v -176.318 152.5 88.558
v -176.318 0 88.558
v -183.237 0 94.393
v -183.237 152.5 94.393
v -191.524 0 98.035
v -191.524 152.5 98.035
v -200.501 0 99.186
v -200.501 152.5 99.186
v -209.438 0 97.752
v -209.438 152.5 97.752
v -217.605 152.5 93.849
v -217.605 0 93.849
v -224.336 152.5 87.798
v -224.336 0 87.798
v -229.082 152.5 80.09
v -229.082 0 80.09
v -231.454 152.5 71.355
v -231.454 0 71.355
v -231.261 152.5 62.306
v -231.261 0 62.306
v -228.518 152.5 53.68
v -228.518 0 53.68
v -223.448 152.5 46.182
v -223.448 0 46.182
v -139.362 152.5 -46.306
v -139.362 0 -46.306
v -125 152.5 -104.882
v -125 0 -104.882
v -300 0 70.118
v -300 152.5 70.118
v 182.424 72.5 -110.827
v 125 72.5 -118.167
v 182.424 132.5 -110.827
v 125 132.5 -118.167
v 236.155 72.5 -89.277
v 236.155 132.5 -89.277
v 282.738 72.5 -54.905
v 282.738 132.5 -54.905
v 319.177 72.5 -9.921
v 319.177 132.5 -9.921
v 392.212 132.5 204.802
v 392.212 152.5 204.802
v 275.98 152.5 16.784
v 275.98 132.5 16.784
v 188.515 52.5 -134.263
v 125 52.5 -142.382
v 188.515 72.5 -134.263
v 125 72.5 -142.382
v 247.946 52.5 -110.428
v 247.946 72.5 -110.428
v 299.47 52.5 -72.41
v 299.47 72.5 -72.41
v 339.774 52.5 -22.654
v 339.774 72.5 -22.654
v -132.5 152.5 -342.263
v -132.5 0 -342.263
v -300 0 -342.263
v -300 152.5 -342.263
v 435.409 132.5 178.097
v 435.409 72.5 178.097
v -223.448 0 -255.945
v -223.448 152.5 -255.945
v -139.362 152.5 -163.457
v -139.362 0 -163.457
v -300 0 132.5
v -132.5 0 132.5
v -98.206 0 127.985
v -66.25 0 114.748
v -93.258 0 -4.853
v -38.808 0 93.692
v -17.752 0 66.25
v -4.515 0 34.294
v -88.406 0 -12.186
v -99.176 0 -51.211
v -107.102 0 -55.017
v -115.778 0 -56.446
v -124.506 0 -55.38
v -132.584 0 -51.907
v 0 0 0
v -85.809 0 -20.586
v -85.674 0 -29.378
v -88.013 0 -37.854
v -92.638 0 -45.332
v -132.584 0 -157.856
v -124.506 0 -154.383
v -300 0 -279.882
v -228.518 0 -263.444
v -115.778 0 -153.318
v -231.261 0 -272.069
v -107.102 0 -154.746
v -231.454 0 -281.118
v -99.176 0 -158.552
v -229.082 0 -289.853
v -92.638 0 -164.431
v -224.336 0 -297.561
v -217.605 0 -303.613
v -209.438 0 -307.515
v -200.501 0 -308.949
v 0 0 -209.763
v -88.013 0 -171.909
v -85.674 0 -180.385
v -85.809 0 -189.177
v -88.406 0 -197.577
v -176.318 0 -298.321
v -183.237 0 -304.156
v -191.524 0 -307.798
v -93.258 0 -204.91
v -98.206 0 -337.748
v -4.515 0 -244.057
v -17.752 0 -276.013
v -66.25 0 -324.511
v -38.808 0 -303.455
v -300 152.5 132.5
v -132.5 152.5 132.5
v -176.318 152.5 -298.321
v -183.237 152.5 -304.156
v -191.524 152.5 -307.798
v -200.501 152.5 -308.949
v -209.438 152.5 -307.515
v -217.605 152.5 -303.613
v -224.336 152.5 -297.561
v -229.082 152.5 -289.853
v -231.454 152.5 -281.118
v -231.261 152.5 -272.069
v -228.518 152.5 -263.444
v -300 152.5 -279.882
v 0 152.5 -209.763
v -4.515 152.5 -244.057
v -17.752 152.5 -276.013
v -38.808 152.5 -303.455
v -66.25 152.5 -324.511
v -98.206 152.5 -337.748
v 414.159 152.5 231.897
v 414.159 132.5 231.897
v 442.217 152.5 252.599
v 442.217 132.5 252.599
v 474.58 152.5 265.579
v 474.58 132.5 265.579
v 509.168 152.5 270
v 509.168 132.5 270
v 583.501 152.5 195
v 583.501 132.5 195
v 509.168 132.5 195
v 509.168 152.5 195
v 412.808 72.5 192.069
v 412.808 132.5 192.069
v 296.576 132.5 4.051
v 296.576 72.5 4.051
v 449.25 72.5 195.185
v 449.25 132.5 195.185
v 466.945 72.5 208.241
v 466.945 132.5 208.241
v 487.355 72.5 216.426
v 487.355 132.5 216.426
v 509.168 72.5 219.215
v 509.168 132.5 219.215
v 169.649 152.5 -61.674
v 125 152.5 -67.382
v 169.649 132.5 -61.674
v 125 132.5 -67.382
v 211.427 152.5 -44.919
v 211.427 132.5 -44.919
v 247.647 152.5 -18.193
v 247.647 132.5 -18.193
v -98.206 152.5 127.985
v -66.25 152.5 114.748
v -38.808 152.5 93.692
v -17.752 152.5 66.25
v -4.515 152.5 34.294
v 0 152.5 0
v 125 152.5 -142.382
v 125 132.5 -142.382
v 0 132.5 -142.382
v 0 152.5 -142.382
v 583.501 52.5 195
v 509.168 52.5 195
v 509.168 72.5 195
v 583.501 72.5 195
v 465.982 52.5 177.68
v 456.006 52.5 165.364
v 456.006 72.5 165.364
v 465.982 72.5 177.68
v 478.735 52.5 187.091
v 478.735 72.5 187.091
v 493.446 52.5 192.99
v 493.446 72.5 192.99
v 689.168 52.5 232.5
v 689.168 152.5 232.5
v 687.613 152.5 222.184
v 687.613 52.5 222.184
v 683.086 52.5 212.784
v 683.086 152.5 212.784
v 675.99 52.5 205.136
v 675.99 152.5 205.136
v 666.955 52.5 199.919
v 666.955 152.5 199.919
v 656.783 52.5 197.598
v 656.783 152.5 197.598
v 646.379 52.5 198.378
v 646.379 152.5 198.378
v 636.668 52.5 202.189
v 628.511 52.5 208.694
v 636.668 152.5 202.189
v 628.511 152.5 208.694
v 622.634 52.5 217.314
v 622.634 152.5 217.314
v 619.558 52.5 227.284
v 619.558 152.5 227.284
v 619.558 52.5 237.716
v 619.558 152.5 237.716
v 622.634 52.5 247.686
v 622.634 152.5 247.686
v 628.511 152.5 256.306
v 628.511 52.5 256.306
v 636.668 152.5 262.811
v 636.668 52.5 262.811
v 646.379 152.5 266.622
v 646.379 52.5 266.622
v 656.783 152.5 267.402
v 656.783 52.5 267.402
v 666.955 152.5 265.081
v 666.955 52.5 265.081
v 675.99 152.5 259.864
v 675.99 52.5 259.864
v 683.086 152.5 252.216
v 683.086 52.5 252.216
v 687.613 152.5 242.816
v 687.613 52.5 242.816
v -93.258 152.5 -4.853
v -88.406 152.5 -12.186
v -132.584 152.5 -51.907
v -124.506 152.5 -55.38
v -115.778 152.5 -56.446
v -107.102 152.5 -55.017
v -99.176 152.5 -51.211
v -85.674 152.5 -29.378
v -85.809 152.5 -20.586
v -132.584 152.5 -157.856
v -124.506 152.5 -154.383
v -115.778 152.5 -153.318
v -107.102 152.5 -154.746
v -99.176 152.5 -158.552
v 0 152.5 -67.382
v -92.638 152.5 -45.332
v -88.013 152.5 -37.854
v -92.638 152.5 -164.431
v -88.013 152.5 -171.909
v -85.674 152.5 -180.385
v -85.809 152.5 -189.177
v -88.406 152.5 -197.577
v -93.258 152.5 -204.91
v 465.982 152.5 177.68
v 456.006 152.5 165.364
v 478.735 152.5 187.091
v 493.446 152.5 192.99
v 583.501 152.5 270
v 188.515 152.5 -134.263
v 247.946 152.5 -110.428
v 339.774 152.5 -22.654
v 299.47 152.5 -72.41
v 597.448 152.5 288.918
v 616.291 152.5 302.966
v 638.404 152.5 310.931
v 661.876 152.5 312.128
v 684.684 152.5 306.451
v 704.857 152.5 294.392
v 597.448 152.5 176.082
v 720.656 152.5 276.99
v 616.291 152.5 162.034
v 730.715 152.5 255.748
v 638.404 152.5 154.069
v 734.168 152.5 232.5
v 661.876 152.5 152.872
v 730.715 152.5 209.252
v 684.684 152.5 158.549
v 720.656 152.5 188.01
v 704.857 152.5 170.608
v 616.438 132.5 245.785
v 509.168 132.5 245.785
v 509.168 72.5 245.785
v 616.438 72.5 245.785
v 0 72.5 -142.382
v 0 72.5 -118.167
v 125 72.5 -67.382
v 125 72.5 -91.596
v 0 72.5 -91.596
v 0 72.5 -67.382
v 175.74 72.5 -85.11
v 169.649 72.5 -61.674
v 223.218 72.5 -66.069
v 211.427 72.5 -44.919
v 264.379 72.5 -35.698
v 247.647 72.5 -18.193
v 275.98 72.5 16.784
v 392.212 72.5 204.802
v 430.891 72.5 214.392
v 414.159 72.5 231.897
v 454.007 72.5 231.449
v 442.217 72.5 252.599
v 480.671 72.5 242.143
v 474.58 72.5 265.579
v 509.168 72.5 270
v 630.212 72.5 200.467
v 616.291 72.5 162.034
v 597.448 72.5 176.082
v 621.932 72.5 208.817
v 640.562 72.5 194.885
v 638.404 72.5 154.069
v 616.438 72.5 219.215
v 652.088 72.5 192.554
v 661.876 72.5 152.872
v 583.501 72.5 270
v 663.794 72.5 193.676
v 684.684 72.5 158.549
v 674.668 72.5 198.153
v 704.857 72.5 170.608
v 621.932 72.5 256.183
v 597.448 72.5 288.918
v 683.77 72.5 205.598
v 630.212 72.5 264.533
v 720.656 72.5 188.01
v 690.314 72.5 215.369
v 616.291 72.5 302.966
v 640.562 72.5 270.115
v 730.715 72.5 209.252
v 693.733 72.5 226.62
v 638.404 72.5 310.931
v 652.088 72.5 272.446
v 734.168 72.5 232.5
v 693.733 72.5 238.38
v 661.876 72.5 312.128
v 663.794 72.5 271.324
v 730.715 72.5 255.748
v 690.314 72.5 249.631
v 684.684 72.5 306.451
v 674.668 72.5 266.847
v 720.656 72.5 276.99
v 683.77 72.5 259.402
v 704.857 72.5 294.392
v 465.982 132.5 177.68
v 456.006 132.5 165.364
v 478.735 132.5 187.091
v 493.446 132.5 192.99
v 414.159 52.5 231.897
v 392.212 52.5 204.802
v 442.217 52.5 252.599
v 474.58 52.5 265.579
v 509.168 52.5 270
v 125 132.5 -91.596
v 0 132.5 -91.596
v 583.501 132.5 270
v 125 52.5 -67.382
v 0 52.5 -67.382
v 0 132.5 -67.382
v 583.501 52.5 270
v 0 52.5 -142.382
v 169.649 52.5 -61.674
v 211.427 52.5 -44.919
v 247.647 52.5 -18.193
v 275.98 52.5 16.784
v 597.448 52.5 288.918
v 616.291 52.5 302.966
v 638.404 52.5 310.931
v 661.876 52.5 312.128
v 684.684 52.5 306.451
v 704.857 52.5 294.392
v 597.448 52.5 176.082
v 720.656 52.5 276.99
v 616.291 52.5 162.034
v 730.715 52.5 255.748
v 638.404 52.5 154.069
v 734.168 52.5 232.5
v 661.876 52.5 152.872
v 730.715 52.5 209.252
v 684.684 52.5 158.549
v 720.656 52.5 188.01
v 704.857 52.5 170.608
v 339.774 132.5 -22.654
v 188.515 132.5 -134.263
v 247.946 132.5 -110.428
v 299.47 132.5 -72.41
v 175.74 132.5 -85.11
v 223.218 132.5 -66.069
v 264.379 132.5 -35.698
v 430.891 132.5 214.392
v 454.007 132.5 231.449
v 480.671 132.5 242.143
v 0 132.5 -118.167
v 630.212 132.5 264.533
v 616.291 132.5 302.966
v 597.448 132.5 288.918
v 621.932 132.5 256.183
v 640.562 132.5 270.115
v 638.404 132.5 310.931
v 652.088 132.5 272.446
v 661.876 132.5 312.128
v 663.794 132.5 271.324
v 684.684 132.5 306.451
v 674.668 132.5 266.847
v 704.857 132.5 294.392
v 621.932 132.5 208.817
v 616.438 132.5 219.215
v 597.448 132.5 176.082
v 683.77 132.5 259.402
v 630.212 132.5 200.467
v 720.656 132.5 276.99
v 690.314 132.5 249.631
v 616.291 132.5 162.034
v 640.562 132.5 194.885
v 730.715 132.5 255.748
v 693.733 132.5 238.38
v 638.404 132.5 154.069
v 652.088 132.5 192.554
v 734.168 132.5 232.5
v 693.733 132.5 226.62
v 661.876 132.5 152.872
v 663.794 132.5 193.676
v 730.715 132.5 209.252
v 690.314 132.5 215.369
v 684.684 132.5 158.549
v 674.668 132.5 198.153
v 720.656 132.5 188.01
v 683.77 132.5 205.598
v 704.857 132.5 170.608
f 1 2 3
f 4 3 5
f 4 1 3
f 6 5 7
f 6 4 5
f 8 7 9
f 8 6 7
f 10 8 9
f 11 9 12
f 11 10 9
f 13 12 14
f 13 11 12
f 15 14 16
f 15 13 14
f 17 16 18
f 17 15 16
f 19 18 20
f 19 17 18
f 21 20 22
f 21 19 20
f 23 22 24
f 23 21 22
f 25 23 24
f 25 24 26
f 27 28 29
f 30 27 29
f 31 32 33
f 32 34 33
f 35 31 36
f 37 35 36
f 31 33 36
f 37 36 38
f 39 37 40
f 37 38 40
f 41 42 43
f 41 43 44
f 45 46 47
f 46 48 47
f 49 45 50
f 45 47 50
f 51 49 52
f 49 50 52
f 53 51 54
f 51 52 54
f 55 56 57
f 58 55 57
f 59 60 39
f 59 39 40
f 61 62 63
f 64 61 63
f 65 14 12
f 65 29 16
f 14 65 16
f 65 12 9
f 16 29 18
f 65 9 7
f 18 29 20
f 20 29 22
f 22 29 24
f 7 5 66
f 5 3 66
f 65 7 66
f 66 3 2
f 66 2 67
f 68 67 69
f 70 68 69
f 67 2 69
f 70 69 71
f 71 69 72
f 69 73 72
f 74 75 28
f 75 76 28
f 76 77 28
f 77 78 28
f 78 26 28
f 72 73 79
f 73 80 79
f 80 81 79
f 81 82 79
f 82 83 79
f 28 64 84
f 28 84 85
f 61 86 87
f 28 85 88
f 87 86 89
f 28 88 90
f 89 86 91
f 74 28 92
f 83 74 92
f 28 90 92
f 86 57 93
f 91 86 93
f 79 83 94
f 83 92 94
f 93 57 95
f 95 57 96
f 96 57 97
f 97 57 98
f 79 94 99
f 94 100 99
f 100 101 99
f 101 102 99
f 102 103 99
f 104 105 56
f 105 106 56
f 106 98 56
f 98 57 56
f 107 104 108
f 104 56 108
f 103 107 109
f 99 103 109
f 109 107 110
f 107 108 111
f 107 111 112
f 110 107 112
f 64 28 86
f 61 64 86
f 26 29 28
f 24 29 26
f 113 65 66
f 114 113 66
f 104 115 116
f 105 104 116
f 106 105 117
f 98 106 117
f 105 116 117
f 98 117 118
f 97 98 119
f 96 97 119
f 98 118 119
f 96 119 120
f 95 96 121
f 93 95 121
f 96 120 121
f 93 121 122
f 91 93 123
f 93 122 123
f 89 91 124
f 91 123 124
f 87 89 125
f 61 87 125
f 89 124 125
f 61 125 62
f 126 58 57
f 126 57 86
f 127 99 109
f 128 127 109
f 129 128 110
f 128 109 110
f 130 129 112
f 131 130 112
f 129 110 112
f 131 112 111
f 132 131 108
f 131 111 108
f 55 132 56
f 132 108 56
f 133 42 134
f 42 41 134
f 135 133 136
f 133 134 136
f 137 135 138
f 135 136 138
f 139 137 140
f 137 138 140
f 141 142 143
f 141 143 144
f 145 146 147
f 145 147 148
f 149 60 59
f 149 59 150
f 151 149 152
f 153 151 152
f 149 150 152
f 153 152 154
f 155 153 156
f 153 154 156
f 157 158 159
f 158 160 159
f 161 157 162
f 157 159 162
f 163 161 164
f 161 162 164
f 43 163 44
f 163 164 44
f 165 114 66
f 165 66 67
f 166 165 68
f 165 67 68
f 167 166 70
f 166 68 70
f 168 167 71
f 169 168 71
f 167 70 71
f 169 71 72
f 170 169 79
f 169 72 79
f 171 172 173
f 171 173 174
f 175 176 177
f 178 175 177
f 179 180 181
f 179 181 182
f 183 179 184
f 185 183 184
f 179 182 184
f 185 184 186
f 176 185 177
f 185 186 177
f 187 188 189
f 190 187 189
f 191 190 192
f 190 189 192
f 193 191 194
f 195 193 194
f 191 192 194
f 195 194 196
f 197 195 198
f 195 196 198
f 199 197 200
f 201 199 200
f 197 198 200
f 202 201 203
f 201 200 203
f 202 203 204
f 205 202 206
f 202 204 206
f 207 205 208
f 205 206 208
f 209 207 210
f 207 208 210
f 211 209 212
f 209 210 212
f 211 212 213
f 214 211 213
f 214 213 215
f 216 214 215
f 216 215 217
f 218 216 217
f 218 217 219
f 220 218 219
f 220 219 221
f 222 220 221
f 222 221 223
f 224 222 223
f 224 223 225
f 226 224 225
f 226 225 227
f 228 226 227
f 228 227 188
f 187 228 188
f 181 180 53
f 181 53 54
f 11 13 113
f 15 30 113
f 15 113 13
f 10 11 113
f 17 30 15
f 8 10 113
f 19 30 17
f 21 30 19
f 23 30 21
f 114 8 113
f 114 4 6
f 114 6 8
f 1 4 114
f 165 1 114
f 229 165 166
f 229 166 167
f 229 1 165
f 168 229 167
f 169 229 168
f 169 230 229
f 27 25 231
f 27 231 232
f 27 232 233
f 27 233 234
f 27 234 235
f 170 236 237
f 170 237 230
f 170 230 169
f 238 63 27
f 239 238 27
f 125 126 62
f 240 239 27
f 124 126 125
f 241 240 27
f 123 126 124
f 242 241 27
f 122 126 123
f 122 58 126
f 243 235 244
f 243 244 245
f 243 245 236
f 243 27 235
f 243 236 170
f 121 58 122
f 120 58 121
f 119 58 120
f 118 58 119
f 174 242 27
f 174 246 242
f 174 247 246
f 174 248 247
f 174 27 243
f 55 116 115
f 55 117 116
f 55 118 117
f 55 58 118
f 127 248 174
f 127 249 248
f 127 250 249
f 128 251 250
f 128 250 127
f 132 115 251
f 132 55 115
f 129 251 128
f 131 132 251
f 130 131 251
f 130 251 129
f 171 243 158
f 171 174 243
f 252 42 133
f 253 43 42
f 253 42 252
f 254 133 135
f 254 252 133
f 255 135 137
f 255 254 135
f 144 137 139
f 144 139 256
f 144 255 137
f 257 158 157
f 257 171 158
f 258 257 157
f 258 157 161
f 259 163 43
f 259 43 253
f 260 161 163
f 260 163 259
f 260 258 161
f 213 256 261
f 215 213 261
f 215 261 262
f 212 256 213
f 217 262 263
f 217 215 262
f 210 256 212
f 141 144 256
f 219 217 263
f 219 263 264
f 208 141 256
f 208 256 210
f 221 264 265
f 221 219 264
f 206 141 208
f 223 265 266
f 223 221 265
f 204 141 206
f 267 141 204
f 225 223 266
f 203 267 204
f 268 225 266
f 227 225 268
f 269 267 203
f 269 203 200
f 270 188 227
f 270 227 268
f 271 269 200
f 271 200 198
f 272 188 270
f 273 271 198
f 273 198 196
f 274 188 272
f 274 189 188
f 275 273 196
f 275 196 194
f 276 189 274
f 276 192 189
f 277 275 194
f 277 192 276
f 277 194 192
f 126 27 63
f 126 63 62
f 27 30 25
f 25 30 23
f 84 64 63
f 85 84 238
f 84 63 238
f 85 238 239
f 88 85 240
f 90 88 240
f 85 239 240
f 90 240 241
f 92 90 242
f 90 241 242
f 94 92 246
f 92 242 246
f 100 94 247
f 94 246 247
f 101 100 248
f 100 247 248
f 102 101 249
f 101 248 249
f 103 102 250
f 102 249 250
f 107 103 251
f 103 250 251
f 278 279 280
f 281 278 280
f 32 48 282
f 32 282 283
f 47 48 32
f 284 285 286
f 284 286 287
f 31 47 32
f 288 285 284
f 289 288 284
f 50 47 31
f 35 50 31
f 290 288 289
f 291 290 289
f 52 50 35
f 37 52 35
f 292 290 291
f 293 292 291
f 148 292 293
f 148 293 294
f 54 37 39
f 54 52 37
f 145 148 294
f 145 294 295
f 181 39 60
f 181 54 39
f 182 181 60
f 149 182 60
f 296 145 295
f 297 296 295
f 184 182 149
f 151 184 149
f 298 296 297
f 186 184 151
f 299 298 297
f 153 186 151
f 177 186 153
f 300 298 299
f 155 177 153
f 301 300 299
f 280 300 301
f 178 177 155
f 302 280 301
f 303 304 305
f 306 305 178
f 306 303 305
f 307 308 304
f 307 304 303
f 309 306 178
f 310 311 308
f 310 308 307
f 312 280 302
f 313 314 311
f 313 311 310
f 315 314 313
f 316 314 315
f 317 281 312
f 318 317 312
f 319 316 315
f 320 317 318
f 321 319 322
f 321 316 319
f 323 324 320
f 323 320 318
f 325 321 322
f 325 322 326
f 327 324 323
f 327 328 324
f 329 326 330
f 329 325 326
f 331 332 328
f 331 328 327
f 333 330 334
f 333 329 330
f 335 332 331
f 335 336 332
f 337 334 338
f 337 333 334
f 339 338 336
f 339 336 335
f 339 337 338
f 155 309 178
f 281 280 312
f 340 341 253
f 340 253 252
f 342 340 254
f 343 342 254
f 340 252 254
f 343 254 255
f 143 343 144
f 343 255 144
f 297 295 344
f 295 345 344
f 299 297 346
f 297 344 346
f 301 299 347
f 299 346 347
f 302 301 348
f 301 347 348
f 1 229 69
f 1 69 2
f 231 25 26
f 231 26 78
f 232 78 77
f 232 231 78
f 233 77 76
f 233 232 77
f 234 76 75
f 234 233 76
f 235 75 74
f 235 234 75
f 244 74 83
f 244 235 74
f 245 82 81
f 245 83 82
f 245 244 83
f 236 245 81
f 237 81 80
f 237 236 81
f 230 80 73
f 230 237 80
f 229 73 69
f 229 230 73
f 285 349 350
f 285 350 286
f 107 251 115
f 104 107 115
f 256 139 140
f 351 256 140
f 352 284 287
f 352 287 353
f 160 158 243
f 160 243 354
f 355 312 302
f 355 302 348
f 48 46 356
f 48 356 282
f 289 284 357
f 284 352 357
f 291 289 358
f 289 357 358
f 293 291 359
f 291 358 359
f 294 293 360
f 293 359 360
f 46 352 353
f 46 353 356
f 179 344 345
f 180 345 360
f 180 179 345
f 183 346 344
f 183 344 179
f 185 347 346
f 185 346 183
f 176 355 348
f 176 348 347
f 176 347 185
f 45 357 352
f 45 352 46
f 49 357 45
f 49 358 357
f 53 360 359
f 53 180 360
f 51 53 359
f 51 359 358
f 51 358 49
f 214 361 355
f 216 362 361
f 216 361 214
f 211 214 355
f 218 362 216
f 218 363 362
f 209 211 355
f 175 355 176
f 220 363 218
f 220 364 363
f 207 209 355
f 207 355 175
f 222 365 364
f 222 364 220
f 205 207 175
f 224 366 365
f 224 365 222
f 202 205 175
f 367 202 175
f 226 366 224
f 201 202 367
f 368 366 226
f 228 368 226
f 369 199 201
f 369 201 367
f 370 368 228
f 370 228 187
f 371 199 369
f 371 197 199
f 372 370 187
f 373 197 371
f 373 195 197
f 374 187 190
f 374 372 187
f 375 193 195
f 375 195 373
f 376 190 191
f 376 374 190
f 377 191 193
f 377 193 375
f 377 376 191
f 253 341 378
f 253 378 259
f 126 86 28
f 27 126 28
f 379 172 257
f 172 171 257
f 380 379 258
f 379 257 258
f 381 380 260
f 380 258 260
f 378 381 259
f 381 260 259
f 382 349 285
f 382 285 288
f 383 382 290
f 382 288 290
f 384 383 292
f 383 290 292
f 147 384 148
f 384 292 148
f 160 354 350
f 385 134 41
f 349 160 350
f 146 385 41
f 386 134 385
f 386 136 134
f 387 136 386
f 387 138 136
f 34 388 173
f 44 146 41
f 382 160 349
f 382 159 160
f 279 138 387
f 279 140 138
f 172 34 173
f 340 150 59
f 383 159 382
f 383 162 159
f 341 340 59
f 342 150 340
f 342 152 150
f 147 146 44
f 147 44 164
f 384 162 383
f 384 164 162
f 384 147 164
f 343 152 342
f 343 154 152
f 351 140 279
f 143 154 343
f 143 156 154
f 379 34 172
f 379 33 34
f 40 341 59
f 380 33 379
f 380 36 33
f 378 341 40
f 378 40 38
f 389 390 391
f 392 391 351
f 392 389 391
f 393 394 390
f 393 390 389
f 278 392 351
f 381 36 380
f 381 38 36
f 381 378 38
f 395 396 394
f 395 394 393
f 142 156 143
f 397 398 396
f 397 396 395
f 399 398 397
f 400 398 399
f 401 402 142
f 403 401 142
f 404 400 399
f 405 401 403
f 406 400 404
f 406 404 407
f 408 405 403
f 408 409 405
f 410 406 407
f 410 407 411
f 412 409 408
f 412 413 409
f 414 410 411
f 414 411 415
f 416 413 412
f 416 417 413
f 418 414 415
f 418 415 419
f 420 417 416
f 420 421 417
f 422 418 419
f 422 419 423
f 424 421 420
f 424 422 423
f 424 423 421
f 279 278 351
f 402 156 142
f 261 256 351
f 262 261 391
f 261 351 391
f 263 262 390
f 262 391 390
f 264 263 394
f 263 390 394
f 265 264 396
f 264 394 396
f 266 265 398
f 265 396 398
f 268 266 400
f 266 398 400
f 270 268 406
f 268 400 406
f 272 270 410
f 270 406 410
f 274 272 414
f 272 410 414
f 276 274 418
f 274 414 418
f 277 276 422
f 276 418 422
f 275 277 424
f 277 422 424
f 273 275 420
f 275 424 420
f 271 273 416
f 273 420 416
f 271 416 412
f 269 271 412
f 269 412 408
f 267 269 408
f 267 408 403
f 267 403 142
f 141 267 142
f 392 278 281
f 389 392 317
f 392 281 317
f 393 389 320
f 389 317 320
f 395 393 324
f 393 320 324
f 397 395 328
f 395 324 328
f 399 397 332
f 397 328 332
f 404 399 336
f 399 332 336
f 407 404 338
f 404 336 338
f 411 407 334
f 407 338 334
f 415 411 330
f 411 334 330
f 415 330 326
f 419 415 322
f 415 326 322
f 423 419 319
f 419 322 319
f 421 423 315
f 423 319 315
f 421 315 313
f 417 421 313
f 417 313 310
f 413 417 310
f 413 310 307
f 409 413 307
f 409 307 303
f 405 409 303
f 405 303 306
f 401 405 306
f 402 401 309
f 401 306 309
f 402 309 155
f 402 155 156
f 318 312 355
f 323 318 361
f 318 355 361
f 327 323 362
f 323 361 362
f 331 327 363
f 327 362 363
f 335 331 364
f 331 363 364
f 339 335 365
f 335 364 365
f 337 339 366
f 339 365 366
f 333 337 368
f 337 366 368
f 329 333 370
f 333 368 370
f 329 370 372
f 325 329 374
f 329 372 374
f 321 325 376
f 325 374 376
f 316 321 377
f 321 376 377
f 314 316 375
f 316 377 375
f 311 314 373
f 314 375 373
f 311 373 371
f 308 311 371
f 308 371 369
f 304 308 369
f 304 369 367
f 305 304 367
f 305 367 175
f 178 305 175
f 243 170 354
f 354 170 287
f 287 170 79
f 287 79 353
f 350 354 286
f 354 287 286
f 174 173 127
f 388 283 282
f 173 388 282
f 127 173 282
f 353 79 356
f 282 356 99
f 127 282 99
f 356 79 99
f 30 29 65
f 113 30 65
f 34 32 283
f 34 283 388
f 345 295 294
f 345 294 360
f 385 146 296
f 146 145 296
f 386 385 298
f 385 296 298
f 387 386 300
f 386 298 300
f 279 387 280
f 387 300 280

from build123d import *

# Parameters (mm, degrees)
BOSS_EXTRUDE1_DEPTH = 152.5
CUT_EXTRUDE1_DEPTH  = 153.5
CUT_EXTRUDE2_REACH  = 154.5
SKETCH7_R           = 35


with BuildPart() as part:
    # Sketch1 → Boss-Extrude1 (new body)
    with BuildSketch(Plane(origin=(0, 0, 0), x_dir=(1, 0, 0), z_dir=(0, 1, 0))):
        with BuildLine():
            Line((-300, -132.5), (-132.5, -132.5))
            ThreePointArc((-132.5, -132.5), (-38.808351493, -93.691648507), (0, 0))
            Line((0, 0), (0, 209.763098819))
            ThreePointArc((0, 209.763098819), (-38.808351493, 303.454747326), (-132.5, 342.263098819))
            Line((-132.5, 342.263098819), (-300, 342.263098819))
            Line((-300, 342.263098819), (-300, 279.881549409))
            Line((-300, 279.881549409), (-125, 104.881549409))
            Line((-125, 104.881549409), (-300, -70.118450591))
            Line((-300, -70.118450591), (-300, -132.5))
        make_face()
    extrude(amount=BOSS_EXTRUDE1_DEPTH)

    # Sketch2 → Cut-Extrude1 (cut, through all)
    with BuildSketch(Plane(origin=(0, 152.5, 0), x_dir=(1, 0, 0), z_dir=(0, 1, 0))):
        with BuildLine():
            Line((-223.447835998, -46.182307711), (-139.361825834, 46.305891731))
            ThreePointArc((-139.361825834, 46.305891731), (-95.697655057, 48.504400086), (-93.258215037, 4.853026901))
            Line((-93.258215037, 4.853026901), (-176.318308109, -88.557599262))
            ThreePointArc((-176.318308109, -88.557599262), (-221.187968417, -91.065122785), (-223.447835998, -46.182307711))
        make_face()
        with BuildLine():
            Line((-93.258215037, 204.910071918), (-176.318308109, 298.320698081))
            ThreePointArc((-176.318308109, 298.320698081), (-221.187968417, 300.828221603), (-223.447835998, 255.94540653))
            Line((-223.447835998, 255.94540653), (-139.361825834, 163.457207088))
            ThreePointArc((-139.361825834, 163.457207088), (-95.697655057, 161.258698732), (-93.258215037, 204.910071918))
        make_face()
    extrude(amount=-CUT_EXTRUDE1_DEPTH, mode=Mode.SUBTRACT)

    # Sweep2: sweep along a path in Sketch4
    with BuildLine(Plane(origin=(0, 0, 0), x_dir=(1, 0, 0), z_dir=(0, 1, 0))) as sweep2_path:
        Line((0, 104.881549409), (125, 104.881549409))
        ThreePointArc((125, 104.881549409), (229.686421658, 77.6733307), (307.876740467, 2.935066808))
        Line((307.876740467, 2.935066808), (424.108620349, -185.083031348))
        ThreePointArc((424.108620349, -185.083031348), (460.476210492, -219.845014554), (509.167569403, -232.5))
        Line((509.167569403, -232.5), (654.167569403, -232.5))
    # Sketch3 → Sweep2 (sweep)
    with BuildSketch(Plane(origin=(0, 0, 0), x_dir=(0, 0, -1), z_dir=(1, 0, 0))):
        Polygon((67.381549409, 152.5), (142.381549409, 152.5), (142.381549409, 132.5), (118.166896534, 132.5), (118.166896534, 72.5), (142.381549409, 72.5), (142.381549409, 52.5), (67.381549409, 52.5), (67.381549409, 72.5), (91.596202285, 72.5), (91.596202285, 132.5), (67.381549409, 132.5), align=None)
    sweep(path=sweep2_path.line)

    # Sketch6 → Revolve2 (revolve)
    with BuildSketch(Plane.XY.offset(232.5)):
        Polygon((654.167569403, 152.5), (574.167569403, 152.5), (574.167569403, 132.5), (614.167569403, 132.5), (614.167569403, 72.5), (574.167569403, 72.5), (574.167569403, 52.5), (654.167569403, 52.5), align=None)
    revolve(axis=Axis((654.167569403, 152.5, 232.5), (0, 1, 0)))

    # Sketch7 → Cut-Extrude2 (cut, up to next)
    with BuildSketch(Plane(origin=(0, 152.5, 0), x_dir=(1, 0, 0), z_dir=(0, 1, 0)), mode=Mode.PRIVATE) as cut_extrude2_sk1:
        with Locations((654.167569403, -232.5)):
            Circle(SKETCH7_R)
    cut_extrude2_tool1 = extrude(cut_extrude2_sk1.sketch, amount=-CUT_EXTRUDE2_REACH, mode=Mode.PRIVATE) & part.part
    add(cut_extrude2_tool1.solids().sort_by_distance((654.167569, 152.5, 232.5))[0], mode=Mode.SUBTRACT)


solid = part.part
